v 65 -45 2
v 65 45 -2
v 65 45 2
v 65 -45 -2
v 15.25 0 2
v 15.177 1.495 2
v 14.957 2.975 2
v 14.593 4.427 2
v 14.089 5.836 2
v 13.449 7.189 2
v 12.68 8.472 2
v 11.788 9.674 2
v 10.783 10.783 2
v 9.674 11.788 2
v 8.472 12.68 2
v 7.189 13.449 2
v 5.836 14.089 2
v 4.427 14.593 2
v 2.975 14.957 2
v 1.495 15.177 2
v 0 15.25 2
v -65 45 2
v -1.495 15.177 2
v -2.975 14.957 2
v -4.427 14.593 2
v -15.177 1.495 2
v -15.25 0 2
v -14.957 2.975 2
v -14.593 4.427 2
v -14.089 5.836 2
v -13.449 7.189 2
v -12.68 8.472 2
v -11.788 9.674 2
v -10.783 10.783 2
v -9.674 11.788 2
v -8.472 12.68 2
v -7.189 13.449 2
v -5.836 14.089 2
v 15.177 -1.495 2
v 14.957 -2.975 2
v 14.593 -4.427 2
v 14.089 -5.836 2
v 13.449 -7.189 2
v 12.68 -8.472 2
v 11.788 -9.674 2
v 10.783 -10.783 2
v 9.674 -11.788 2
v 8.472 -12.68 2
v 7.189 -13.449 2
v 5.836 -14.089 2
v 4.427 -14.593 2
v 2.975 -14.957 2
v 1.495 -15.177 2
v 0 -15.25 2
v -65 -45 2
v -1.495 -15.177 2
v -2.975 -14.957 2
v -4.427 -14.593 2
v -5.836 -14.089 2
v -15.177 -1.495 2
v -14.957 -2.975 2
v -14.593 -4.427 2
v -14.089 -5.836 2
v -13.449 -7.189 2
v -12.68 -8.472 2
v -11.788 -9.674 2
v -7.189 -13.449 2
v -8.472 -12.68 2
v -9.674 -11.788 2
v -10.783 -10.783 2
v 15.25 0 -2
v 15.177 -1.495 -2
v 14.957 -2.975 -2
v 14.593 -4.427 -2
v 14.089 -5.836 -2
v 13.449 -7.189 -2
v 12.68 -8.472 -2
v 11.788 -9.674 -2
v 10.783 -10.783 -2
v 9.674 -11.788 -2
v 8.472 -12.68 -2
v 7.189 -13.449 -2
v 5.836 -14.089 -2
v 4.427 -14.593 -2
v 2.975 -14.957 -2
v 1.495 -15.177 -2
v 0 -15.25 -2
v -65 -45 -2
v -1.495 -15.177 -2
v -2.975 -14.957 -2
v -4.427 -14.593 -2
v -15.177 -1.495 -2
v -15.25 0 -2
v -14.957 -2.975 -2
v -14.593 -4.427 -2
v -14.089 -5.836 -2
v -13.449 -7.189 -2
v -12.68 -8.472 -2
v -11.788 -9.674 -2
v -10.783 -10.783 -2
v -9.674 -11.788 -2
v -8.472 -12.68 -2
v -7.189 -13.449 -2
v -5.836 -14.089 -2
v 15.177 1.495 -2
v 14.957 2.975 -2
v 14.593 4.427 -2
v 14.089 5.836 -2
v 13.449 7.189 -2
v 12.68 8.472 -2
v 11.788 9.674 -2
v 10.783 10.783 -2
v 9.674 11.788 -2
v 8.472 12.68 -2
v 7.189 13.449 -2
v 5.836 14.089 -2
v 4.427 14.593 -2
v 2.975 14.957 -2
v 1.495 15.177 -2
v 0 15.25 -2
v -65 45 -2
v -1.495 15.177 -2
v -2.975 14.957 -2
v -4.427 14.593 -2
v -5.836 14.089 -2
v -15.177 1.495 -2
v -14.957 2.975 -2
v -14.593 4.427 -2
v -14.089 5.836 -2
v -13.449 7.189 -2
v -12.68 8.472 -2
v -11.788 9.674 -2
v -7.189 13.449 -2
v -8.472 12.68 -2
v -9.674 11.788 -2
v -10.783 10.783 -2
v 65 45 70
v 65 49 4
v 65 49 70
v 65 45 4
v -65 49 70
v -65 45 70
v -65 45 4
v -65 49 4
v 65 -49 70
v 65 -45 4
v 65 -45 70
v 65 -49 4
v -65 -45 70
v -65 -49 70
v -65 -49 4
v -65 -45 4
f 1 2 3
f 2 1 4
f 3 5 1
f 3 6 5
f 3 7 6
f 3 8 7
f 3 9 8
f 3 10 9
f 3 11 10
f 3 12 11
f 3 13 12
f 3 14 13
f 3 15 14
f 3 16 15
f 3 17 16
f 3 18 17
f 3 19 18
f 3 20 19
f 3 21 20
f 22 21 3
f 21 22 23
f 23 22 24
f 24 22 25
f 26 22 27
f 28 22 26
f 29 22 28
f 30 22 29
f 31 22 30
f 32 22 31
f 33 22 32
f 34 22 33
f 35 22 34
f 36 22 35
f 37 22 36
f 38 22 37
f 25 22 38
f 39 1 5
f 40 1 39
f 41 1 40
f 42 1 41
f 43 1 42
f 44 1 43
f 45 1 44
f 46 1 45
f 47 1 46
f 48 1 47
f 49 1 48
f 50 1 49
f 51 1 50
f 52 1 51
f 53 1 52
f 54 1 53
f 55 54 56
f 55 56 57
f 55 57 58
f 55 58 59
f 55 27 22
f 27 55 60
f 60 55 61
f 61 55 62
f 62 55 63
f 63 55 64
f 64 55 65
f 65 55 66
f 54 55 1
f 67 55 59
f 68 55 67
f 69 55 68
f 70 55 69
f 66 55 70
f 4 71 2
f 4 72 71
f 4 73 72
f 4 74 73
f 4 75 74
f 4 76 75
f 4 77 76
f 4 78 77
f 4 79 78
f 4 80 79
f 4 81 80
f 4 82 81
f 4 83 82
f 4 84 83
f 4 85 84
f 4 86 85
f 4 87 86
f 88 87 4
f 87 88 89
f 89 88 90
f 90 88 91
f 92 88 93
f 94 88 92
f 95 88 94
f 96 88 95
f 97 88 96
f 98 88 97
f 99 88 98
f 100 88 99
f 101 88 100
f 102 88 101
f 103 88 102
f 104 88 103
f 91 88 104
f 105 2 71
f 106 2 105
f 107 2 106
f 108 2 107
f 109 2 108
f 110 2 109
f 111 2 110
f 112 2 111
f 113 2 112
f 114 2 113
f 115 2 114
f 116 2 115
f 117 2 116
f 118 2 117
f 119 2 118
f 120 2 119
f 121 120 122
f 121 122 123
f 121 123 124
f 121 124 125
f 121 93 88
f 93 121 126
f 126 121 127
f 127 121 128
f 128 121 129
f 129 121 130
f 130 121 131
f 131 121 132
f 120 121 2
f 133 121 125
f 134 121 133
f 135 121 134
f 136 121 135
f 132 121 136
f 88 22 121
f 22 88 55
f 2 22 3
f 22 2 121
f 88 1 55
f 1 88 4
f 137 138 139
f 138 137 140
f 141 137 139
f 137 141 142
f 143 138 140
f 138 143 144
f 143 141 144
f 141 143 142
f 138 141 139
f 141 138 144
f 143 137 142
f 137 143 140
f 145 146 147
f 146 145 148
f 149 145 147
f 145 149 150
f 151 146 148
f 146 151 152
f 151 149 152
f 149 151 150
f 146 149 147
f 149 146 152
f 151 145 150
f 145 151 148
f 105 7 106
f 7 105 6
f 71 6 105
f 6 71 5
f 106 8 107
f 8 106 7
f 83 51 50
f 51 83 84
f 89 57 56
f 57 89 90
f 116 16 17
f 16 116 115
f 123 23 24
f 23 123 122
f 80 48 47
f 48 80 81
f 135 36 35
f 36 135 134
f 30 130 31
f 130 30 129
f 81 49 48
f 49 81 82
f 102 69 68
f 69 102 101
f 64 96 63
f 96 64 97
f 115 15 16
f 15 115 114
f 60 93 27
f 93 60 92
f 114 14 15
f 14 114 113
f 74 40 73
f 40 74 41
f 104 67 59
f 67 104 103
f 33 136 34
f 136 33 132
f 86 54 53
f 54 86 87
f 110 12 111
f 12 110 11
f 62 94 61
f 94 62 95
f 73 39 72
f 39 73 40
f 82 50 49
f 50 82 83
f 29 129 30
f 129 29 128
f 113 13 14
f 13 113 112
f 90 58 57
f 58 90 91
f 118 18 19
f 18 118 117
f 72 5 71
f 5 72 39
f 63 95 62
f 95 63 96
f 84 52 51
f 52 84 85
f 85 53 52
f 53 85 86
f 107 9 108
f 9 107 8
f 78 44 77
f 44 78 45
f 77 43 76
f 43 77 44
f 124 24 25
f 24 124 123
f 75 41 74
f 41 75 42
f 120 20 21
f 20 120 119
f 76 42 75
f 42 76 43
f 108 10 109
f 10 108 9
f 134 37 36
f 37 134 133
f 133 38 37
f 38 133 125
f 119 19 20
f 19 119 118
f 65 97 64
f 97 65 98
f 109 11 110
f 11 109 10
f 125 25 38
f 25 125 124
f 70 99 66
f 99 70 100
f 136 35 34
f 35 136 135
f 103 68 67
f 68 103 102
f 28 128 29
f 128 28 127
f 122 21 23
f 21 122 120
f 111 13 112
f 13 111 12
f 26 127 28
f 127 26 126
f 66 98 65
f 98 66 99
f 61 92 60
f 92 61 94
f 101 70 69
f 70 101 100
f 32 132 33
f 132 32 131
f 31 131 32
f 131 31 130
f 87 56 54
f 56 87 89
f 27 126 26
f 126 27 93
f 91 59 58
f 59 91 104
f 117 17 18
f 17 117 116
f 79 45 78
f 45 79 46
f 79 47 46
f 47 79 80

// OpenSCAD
$fn = 64;

// Plate dimensions
plate_x = 130;      // Length along X
plate_y = 90;       // Width along Y
plate_z = 4;        // Thickness

// Hole dimensions
hole_dia = 30.5;    // Diameter of tube holes

// Hole grid spacing
hole_spacing_x = 40; // Centre-to-centre along X
hole_spacing_y = 40; // Centre-to-centre along Y

// Wall dimensions
wall_x = 130;       // Length along X
wall_y = 4;         // Thickness along Y
wall_h = 66;        // Height above plate (rises to z=70)

// Hole centres (3 along X, 2 along Y)
x_centers = [-40, 0, 40];
y_centers = [-20, 20];

difference() {
  union() {
    // Base plate
    cube([plate_x, plate_y, plate_z], center = true);
    
    // Long walls (flush with plate edges)
    translate([0, plate_y/2 + wall_y/2, plate_z + wall_h/2])
      cube([wall_x, wall_y, wall_h], center = true);
      
    translate([0, -plate_y/2 - wall_y/2, plate_z + wall_h/2])
      cube([wall_x, wall_y, wall_h], center = true);
  }
  
  // Through-holes
  for (x = x_centers) {
    for (y = y_centers) {
      cylinder(d = hole_dia, h = plate_z + 0.5, center = true);
    }
  }
}
